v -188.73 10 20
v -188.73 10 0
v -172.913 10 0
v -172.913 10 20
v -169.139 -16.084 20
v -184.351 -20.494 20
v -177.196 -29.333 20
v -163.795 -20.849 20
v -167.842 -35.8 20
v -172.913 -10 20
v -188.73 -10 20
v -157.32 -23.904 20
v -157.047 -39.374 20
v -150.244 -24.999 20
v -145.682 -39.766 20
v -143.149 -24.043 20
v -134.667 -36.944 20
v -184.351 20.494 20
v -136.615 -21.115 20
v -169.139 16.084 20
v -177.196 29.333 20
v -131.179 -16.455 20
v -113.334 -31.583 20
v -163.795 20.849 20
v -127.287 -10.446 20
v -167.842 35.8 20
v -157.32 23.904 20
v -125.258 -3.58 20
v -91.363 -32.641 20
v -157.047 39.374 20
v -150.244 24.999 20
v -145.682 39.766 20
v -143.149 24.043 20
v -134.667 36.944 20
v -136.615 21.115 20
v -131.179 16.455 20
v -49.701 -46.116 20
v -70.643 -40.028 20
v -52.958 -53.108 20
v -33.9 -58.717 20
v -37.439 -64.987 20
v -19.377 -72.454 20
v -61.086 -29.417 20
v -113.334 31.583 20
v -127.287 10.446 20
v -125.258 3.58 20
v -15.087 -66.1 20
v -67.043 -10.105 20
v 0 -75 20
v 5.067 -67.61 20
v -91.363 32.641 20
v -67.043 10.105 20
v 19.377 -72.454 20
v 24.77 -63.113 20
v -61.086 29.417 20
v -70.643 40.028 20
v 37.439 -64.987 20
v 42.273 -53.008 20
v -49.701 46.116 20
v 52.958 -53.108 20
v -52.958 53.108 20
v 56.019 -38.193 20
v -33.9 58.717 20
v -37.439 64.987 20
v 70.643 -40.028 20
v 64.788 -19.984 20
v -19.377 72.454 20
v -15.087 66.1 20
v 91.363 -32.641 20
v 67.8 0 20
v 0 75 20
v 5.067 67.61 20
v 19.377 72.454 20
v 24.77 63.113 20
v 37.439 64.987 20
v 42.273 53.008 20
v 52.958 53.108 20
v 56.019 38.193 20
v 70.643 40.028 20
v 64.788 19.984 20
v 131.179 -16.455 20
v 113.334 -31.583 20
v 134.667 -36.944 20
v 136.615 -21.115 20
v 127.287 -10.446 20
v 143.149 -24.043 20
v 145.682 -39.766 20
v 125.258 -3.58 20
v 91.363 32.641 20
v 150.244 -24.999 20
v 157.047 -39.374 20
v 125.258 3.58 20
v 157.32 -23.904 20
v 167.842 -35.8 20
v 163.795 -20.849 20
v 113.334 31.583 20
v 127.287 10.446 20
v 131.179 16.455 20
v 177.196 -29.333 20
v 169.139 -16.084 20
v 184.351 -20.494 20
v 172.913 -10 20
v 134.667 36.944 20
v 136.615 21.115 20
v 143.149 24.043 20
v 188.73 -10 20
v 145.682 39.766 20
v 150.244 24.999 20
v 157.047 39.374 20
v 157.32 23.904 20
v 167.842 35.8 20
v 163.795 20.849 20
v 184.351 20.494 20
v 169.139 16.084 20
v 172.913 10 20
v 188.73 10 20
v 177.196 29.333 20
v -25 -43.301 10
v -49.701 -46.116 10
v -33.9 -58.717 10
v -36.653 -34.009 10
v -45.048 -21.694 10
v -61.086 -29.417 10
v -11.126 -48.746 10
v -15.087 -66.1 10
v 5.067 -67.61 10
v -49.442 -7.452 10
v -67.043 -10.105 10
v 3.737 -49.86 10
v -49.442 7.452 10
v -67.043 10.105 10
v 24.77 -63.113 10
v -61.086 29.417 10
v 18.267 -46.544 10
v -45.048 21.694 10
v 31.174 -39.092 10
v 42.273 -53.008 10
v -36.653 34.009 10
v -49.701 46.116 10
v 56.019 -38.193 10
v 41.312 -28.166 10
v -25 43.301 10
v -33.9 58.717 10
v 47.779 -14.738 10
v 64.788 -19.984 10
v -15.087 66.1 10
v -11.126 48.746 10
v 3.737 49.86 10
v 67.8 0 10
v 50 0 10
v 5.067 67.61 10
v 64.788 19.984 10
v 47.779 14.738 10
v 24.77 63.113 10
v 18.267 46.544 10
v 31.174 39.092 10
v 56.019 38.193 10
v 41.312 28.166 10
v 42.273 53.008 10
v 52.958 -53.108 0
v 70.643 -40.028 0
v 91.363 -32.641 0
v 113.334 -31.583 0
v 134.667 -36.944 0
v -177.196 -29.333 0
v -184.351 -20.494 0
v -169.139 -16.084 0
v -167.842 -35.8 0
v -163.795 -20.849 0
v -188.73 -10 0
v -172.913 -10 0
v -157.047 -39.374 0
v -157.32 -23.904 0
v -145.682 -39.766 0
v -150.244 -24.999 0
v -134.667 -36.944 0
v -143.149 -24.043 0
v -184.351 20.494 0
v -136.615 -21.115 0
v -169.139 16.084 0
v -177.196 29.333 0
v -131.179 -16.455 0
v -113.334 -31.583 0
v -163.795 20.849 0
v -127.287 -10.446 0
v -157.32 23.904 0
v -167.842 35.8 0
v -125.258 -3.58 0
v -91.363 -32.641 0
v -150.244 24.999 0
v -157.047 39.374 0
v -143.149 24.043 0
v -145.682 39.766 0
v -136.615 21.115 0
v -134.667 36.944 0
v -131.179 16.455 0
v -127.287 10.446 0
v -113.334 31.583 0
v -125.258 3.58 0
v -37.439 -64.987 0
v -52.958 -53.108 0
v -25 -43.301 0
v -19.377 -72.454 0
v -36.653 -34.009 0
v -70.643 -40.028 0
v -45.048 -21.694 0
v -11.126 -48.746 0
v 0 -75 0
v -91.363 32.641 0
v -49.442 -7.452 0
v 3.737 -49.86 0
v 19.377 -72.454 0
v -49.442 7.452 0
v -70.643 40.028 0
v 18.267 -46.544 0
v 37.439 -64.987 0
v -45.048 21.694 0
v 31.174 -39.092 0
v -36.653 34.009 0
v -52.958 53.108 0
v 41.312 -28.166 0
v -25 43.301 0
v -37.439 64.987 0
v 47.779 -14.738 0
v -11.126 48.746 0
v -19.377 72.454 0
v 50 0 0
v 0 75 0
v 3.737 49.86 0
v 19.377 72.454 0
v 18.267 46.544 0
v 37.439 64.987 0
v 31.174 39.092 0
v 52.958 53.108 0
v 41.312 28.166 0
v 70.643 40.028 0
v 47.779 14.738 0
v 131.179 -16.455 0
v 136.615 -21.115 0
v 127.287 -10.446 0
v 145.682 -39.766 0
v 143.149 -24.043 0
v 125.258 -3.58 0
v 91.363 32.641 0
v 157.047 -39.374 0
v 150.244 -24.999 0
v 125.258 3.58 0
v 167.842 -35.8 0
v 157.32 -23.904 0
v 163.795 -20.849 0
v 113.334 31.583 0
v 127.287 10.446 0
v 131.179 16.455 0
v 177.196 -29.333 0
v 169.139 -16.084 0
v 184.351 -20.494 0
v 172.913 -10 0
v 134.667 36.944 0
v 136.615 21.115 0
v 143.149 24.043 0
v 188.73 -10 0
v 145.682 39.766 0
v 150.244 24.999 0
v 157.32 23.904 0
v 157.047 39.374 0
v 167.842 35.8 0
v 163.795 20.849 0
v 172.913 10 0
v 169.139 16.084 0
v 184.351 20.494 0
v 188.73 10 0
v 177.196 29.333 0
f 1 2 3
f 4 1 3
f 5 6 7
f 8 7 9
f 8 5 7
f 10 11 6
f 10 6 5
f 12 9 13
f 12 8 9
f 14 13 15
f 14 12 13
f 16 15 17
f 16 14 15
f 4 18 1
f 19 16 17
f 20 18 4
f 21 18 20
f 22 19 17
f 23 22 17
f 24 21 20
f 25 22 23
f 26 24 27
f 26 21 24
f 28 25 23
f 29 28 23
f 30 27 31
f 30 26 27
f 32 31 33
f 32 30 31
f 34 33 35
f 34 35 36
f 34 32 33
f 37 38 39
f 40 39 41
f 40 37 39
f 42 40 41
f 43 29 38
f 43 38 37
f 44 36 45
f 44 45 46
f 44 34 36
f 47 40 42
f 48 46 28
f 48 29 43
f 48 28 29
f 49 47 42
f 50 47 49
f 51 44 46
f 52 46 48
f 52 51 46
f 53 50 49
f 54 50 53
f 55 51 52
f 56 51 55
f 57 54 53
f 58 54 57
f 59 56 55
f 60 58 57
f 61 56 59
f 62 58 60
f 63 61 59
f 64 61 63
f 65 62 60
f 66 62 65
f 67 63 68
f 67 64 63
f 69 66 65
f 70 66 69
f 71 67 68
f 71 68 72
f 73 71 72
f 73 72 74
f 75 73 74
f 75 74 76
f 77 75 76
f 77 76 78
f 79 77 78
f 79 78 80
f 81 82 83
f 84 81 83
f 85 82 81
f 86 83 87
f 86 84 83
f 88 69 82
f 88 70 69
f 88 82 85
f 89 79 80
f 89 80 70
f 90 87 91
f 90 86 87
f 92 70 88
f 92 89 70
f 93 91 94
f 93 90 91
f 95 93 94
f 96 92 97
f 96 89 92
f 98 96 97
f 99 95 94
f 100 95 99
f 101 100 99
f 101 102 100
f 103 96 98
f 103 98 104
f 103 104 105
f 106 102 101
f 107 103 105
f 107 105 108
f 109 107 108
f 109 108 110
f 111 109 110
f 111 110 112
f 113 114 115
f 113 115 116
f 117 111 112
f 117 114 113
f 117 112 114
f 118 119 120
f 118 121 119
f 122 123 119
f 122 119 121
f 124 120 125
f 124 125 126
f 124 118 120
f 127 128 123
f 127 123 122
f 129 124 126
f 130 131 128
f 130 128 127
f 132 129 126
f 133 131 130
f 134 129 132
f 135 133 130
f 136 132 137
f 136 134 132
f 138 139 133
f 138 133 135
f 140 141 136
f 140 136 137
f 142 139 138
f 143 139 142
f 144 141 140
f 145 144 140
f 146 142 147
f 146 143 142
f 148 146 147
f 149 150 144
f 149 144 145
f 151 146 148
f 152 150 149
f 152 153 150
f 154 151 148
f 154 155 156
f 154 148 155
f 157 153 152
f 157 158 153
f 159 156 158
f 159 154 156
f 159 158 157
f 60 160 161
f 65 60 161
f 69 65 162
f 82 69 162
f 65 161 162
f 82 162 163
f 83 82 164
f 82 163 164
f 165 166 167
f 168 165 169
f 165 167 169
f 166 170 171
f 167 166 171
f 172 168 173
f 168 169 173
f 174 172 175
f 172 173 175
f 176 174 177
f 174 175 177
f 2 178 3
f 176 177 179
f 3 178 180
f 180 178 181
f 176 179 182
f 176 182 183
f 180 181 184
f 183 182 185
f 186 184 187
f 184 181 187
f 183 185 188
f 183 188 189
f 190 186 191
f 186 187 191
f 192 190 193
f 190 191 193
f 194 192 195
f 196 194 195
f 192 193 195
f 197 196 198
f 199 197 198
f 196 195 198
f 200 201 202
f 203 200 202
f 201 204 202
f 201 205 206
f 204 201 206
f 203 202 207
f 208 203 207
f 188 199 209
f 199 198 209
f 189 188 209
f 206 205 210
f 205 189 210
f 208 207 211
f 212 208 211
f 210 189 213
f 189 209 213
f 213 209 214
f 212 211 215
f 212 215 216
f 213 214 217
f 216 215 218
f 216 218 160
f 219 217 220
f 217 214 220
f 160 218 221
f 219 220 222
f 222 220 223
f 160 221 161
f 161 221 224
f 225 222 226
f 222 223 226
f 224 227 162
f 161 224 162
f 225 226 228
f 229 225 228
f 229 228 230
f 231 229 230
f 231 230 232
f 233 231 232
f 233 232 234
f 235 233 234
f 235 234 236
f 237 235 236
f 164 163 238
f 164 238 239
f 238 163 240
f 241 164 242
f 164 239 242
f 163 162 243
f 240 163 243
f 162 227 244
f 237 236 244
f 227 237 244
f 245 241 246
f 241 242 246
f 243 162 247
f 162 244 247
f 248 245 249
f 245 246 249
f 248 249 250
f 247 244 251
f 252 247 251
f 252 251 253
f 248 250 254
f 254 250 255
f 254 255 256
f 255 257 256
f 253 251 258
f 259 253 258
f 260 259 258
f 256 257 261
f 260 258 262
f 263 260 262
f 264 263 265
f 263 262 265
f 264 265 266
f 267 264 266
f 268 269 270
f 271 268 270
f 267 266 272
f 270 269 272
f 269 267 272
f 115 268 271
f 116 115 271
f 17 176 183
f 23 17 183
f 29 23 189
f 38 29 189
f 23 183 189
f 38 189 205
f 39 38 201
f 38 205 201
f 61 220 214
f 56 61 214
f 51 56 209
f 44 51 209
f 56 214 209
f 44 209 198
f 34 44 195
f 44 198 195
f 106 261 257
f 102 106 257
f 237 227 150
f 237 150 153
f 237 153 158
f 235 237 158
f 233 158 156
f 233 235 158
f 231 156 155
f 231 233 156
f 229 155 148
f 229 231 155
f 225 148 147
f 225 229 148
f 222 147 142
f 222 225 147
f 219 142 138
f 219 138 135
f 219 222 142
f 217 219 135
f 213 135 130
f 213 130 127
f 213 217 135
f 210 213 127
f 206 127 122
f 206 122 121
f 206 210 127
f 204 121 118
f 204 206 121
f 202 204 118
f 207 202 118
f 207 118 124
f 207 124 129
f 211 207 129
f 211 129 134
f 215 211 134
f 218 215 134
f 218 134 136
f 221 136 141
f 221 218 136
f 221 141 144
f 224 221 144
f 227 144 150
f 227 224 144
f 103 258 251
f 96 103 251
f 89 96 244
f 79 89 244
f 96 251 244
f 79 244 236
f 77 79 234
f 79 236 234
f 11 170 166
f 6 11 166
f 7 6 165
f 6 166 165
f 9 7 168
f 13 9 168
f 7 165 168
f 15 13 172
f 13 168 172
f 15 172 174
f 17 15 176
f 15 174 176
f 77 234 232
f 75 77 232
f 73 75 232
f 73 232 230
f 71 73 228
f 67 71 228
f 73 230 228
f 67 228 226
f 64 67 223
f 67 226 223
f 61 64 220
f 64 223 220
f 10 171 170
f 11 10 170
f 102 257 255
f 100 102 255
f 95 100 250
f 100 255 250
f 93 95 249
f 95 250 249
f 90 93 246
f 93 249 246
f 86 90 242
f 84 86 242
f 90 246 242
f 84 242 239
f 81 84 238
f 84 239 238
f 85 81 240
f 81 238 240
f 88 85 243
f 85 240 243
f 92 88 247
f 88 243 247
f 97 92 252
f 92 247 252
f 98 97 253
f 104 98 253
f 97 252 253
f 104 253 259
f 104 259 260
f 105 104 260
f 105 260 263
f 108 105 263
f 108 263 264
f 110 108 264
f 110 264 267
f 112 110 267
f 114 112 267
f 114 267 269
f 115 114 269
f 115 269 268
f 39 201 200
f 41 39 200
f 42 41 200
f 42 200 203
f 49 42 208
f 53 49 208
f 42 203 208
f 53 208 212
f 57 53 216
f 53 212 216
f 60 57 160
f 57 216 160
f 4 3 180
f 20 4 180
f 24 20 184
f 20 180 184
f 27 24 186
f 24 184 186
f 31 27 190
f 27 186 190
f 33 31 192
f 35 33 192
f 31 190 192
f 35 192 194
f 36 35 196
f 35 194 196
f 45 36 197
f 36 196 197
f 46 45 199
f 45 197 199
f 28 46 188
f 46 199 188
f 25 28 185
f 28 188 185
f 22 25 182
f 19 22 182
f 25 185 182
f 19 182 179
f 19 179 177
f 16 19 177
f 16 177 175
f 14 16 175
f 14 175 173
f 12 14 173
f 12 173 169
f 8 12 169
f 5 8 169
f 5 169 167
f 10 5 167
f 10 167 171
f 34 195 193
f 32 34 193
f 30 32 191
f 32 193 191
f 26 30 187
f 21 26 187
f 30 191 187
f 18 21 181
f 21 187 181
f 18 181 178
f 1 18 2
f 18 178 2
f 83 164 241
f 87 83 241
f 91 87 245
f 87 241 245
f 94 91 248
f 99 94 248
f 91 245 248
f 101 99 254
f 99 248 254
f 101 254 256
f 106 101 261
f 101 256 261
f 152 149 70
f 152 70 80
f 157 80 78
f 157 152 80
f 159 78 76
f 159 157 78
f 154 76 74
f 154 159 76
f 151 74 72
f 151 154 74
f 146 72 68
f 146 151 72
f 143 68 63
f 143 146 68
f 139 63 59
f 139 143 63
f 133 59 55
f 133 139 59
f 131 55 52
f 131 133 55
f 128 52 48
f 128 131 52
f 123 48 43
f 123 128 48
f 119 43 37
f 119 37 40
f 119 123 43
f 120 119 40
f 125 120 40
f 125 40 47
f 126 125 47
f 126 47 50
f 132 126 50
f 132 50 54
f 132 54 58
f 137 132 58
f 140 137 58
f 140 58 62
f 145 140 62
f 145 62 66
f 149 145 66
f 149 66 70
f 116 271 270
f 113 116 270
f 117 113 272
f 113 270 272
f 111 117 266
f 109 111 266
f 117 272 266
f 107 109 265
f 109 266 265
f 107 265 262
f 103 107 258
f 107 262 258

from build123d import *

# Parameters (mm, degrees)
ESQUISSE1_R        = 67.8
BOSS_EXTRU_1_DEPTH = 20
ESQUISSE1_4_R      = 67.8
ESQUISSE1_4_R_2    = 50
BOSS_EXTRU_2_DEPTH = 10


with BuildPart() as part:
    # Esquisse1 → Boss.-Extru.1 (new body)
    with BuildSketch(Plane.XY):
        with BuildLine():
            Line((-188.729833462, 10), (-172.912878475, 10))
            ThreePointArc((-172.912878475, 10), (-125, 0), (-172.912878475, -10))
            Line((-172.912878475, -10), (-188.729833462, -10))
            ThreePointArc((-188.729833462, -10), (-167.842344673, -35.800149952), (-134.666666667, -36.944402673))
            ThreePointArc((-134.666666667, -36.944402673), (-91.362529225, -32.640861336), (-52.958333333, -53.107578843))
            ThreePointArc((-52.958333333, -53.107578843), (0, -75), (52.958333333, -53.107578843))
            ThreePointArc((52.958333333, -53.107578843), (91.362529225, -32.640861336), (134.666666667, -36.944402673))
            ThreePointArc((134.666666667, -36.944402673), (167.842344673, -35.800149952), (188.729833462, -10))
            Line((188.729833462, -10), (172.912878475, -10))
            ThreePointArc((172.912878475, -10), (125, 0), (172.912878475, 10))
            Line((172.912878475, 10), (188.729833462, 10))
            ThreePointArc((188.729833462, 10), (167.842344673, 35.800149952), (134.666666667, 36.944402673))
            ThreePointArc((134.666666667, 36.944402673), (91.362529225, 32.640861336), (52.958333333, 53.107578843))
            ThreePointArc((52.958333333, 53.107578843), (0, 75), (-52.958333333, 53.107578843))
            ThreePointArc((-52.958333333, 53.107578843), (-91.362529225, 32.640861336), (-134.666666667, 36.944402673))
            ThreePointArc((-134.666666667, 36.944402673), (-167.842344673, 35.800149952), (-188.729833462, 10))
        make_face()
        Circle(ESQUISSE1_R, mode=Mode.SUBTRACT)
    extrude(amount=BOSS_EXTRU_1_DEPTH)

    # Esquisse1_4 → Boss.-Extru.2 (add)
    with BuildSketch(Plane.XY):
        Circle(ESQUISSE1_4_R)
        Circle(ESQUISSE1_4_R_2, mode=Mode.SUBTRACT)
    extrude(amount=BOSS_EXTRU_2_DEPTH)


solid = part.part
